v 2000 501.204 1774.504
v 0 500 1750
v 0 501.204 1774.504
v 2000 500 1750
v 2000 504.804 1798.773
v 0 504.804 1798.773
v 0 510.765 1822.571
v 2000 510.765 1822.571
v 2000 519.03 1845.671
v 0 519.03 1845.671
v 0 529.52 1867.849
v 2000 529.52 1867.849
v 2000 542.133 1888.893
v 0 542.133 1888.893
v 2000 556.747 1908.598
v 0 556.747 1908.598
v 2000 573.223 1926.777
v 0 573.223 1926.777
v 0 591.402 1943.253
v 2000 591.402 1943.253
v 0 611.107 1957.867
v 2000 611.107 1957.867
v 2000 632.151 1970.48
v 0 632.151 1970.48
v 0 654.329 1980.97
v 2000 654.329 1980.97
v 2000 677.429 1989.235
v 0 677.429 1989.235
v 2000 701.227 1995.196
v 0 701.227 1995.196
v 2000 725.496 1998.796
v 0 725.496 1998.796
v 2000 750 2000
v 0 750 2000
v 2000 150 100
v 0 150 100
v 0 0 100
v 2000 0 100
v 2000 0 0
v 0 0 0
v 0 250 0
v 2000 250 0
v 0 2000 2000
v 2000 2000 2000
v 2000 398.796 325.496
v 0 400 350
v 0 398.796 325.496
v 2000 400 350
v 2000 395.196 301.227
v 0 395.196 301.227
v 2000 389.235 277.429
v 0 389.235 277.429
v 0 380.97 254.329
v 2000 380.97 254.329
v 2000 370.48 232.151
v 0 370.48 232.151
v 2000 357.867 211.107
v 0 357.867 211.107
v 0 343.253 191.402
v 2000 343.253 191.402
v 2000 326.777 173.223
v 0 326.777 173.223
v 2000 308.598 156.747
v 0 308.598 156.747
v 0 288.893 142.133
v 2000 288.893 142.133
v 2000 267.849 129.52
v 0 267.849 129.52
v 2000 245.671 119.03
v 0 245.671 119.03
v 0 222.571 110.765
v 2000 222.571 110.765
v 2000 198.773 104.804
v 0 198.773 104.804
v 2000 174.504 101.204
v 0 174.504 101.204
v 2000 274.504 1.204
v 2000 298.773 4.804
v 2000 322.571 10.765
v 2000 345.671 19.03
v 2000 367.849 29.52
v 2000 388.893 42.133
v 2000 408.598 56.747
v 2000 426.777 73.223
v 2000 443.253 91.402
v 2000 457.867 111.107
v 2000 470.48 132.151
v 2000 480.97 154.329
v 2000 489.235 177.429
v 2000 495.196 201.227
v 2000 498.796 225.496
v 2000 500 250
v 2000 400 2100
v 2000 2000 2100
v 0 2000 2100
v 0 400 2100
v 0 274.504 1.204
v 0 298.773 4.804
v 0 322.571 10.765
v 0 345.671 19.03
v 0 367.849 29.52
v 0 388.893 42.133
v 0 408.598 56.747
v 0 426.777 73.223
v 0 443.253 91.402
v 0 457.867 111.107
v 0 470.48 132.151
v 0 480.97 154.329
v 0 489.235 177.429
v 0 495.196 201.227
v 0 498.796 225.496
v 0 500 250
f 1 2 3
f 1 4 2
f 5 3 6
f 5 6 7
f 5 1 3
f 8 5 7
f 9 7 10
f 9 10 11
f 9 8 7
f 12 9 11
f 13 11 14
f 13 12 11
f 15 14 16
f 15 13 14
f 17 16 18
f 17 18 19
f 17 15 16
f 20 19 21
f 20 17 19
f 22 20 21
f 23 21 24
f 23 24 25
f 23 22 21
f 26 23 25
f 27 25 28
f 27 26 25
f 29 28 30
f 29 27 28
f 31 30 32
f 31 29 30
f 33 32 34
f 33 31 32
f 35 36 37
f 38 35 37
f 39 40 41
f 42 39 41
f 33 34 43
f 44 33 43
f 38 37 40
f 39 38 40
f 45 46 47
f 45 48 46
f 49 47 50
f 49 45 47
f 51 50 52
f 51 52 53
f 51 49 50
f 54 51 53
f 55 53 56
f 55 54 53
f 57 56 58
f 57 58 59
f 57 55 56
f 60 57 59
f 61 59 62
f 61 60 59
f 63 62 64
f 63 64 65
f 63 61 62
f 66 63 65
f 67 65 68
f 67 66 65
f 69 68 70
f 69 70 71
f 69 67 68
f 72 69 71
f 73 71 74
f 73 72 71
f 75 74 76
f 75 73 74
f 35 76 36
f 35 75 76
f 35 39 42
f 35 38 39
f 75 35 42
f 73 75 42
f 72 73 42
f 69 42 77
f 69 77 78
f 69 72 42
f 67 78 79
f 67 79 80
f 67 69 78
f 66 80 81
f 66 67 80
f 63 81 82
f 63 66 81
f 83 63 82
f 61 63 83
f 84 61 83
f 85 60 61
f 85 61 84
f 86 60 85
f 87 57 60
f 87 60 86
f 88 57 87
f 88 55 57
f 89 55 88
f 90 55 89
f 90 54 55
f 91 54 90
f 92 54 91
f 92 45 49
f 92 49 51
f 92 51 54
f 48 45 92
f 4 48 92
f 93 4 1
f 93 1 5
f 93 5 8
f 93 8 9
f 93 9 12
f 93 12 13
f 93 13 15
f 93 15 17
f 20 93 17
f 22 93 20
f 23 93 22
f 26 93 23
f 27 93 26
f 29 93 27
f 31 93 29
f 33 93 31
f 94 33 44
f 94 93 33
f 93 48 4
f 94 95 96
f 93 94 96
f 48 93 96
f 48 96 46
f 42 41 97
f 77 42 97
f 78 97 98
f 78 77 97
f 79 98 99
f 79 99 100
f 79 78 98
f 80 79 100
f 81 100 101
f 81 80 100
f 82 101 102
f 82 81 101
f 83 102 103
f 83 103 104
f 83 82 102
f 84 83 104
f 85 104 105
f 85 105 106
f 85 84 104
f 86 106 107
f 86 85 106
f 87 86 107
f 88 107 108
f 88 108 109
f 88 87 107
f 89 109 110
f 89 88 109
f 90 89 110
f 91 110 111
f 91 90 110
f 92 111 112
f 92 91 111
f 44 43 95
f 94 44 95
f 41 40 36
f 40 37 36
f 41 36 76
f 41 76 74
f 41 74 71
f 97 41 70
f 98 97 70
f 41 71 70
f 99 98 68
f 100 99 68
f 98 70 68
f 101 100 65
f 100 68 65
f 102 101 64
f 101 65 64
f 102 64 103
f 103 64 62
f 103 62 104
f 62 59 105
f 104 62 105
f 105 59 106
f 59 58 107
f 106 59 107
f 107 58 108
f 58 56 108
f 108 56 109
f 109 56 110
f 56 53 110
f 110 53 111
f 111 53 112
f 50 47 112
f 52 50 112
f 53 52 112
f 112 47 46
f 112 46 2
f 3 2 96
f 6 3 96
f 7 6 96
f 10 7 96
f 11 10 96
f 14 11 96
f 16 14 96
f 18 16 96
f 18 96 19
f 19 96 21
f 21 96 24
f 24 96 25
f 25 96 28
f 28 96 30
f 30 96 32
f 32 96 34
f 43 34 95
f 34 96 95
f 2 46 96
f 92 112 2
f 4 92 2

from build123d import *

# Parameters (mm, degrees)
F1_DEPTH = 2000
F2_R     = 250


with BuildPart() as f1:
    # F0 (on Right) → F1 (new body)
    with BuildSketch(Plane.YZ):
        Polygon((0, 100), (0, 0), (500, 0), (500, 2000), (2000, 2000), (2000, 2100), (400, 2100), (400, 100), align=None)
    extrude(amount=F1_DEPTH)

    # F2
    f2_edges = [f1.edges().sort_by_distance(p)[0] for p in [
        (1000, 500, 2000),
        (1000, 500, 0),
        (1000, 400, 100),
    ]]
    fillet(f2_edges, radius=F2_R)


solid = f1.part
